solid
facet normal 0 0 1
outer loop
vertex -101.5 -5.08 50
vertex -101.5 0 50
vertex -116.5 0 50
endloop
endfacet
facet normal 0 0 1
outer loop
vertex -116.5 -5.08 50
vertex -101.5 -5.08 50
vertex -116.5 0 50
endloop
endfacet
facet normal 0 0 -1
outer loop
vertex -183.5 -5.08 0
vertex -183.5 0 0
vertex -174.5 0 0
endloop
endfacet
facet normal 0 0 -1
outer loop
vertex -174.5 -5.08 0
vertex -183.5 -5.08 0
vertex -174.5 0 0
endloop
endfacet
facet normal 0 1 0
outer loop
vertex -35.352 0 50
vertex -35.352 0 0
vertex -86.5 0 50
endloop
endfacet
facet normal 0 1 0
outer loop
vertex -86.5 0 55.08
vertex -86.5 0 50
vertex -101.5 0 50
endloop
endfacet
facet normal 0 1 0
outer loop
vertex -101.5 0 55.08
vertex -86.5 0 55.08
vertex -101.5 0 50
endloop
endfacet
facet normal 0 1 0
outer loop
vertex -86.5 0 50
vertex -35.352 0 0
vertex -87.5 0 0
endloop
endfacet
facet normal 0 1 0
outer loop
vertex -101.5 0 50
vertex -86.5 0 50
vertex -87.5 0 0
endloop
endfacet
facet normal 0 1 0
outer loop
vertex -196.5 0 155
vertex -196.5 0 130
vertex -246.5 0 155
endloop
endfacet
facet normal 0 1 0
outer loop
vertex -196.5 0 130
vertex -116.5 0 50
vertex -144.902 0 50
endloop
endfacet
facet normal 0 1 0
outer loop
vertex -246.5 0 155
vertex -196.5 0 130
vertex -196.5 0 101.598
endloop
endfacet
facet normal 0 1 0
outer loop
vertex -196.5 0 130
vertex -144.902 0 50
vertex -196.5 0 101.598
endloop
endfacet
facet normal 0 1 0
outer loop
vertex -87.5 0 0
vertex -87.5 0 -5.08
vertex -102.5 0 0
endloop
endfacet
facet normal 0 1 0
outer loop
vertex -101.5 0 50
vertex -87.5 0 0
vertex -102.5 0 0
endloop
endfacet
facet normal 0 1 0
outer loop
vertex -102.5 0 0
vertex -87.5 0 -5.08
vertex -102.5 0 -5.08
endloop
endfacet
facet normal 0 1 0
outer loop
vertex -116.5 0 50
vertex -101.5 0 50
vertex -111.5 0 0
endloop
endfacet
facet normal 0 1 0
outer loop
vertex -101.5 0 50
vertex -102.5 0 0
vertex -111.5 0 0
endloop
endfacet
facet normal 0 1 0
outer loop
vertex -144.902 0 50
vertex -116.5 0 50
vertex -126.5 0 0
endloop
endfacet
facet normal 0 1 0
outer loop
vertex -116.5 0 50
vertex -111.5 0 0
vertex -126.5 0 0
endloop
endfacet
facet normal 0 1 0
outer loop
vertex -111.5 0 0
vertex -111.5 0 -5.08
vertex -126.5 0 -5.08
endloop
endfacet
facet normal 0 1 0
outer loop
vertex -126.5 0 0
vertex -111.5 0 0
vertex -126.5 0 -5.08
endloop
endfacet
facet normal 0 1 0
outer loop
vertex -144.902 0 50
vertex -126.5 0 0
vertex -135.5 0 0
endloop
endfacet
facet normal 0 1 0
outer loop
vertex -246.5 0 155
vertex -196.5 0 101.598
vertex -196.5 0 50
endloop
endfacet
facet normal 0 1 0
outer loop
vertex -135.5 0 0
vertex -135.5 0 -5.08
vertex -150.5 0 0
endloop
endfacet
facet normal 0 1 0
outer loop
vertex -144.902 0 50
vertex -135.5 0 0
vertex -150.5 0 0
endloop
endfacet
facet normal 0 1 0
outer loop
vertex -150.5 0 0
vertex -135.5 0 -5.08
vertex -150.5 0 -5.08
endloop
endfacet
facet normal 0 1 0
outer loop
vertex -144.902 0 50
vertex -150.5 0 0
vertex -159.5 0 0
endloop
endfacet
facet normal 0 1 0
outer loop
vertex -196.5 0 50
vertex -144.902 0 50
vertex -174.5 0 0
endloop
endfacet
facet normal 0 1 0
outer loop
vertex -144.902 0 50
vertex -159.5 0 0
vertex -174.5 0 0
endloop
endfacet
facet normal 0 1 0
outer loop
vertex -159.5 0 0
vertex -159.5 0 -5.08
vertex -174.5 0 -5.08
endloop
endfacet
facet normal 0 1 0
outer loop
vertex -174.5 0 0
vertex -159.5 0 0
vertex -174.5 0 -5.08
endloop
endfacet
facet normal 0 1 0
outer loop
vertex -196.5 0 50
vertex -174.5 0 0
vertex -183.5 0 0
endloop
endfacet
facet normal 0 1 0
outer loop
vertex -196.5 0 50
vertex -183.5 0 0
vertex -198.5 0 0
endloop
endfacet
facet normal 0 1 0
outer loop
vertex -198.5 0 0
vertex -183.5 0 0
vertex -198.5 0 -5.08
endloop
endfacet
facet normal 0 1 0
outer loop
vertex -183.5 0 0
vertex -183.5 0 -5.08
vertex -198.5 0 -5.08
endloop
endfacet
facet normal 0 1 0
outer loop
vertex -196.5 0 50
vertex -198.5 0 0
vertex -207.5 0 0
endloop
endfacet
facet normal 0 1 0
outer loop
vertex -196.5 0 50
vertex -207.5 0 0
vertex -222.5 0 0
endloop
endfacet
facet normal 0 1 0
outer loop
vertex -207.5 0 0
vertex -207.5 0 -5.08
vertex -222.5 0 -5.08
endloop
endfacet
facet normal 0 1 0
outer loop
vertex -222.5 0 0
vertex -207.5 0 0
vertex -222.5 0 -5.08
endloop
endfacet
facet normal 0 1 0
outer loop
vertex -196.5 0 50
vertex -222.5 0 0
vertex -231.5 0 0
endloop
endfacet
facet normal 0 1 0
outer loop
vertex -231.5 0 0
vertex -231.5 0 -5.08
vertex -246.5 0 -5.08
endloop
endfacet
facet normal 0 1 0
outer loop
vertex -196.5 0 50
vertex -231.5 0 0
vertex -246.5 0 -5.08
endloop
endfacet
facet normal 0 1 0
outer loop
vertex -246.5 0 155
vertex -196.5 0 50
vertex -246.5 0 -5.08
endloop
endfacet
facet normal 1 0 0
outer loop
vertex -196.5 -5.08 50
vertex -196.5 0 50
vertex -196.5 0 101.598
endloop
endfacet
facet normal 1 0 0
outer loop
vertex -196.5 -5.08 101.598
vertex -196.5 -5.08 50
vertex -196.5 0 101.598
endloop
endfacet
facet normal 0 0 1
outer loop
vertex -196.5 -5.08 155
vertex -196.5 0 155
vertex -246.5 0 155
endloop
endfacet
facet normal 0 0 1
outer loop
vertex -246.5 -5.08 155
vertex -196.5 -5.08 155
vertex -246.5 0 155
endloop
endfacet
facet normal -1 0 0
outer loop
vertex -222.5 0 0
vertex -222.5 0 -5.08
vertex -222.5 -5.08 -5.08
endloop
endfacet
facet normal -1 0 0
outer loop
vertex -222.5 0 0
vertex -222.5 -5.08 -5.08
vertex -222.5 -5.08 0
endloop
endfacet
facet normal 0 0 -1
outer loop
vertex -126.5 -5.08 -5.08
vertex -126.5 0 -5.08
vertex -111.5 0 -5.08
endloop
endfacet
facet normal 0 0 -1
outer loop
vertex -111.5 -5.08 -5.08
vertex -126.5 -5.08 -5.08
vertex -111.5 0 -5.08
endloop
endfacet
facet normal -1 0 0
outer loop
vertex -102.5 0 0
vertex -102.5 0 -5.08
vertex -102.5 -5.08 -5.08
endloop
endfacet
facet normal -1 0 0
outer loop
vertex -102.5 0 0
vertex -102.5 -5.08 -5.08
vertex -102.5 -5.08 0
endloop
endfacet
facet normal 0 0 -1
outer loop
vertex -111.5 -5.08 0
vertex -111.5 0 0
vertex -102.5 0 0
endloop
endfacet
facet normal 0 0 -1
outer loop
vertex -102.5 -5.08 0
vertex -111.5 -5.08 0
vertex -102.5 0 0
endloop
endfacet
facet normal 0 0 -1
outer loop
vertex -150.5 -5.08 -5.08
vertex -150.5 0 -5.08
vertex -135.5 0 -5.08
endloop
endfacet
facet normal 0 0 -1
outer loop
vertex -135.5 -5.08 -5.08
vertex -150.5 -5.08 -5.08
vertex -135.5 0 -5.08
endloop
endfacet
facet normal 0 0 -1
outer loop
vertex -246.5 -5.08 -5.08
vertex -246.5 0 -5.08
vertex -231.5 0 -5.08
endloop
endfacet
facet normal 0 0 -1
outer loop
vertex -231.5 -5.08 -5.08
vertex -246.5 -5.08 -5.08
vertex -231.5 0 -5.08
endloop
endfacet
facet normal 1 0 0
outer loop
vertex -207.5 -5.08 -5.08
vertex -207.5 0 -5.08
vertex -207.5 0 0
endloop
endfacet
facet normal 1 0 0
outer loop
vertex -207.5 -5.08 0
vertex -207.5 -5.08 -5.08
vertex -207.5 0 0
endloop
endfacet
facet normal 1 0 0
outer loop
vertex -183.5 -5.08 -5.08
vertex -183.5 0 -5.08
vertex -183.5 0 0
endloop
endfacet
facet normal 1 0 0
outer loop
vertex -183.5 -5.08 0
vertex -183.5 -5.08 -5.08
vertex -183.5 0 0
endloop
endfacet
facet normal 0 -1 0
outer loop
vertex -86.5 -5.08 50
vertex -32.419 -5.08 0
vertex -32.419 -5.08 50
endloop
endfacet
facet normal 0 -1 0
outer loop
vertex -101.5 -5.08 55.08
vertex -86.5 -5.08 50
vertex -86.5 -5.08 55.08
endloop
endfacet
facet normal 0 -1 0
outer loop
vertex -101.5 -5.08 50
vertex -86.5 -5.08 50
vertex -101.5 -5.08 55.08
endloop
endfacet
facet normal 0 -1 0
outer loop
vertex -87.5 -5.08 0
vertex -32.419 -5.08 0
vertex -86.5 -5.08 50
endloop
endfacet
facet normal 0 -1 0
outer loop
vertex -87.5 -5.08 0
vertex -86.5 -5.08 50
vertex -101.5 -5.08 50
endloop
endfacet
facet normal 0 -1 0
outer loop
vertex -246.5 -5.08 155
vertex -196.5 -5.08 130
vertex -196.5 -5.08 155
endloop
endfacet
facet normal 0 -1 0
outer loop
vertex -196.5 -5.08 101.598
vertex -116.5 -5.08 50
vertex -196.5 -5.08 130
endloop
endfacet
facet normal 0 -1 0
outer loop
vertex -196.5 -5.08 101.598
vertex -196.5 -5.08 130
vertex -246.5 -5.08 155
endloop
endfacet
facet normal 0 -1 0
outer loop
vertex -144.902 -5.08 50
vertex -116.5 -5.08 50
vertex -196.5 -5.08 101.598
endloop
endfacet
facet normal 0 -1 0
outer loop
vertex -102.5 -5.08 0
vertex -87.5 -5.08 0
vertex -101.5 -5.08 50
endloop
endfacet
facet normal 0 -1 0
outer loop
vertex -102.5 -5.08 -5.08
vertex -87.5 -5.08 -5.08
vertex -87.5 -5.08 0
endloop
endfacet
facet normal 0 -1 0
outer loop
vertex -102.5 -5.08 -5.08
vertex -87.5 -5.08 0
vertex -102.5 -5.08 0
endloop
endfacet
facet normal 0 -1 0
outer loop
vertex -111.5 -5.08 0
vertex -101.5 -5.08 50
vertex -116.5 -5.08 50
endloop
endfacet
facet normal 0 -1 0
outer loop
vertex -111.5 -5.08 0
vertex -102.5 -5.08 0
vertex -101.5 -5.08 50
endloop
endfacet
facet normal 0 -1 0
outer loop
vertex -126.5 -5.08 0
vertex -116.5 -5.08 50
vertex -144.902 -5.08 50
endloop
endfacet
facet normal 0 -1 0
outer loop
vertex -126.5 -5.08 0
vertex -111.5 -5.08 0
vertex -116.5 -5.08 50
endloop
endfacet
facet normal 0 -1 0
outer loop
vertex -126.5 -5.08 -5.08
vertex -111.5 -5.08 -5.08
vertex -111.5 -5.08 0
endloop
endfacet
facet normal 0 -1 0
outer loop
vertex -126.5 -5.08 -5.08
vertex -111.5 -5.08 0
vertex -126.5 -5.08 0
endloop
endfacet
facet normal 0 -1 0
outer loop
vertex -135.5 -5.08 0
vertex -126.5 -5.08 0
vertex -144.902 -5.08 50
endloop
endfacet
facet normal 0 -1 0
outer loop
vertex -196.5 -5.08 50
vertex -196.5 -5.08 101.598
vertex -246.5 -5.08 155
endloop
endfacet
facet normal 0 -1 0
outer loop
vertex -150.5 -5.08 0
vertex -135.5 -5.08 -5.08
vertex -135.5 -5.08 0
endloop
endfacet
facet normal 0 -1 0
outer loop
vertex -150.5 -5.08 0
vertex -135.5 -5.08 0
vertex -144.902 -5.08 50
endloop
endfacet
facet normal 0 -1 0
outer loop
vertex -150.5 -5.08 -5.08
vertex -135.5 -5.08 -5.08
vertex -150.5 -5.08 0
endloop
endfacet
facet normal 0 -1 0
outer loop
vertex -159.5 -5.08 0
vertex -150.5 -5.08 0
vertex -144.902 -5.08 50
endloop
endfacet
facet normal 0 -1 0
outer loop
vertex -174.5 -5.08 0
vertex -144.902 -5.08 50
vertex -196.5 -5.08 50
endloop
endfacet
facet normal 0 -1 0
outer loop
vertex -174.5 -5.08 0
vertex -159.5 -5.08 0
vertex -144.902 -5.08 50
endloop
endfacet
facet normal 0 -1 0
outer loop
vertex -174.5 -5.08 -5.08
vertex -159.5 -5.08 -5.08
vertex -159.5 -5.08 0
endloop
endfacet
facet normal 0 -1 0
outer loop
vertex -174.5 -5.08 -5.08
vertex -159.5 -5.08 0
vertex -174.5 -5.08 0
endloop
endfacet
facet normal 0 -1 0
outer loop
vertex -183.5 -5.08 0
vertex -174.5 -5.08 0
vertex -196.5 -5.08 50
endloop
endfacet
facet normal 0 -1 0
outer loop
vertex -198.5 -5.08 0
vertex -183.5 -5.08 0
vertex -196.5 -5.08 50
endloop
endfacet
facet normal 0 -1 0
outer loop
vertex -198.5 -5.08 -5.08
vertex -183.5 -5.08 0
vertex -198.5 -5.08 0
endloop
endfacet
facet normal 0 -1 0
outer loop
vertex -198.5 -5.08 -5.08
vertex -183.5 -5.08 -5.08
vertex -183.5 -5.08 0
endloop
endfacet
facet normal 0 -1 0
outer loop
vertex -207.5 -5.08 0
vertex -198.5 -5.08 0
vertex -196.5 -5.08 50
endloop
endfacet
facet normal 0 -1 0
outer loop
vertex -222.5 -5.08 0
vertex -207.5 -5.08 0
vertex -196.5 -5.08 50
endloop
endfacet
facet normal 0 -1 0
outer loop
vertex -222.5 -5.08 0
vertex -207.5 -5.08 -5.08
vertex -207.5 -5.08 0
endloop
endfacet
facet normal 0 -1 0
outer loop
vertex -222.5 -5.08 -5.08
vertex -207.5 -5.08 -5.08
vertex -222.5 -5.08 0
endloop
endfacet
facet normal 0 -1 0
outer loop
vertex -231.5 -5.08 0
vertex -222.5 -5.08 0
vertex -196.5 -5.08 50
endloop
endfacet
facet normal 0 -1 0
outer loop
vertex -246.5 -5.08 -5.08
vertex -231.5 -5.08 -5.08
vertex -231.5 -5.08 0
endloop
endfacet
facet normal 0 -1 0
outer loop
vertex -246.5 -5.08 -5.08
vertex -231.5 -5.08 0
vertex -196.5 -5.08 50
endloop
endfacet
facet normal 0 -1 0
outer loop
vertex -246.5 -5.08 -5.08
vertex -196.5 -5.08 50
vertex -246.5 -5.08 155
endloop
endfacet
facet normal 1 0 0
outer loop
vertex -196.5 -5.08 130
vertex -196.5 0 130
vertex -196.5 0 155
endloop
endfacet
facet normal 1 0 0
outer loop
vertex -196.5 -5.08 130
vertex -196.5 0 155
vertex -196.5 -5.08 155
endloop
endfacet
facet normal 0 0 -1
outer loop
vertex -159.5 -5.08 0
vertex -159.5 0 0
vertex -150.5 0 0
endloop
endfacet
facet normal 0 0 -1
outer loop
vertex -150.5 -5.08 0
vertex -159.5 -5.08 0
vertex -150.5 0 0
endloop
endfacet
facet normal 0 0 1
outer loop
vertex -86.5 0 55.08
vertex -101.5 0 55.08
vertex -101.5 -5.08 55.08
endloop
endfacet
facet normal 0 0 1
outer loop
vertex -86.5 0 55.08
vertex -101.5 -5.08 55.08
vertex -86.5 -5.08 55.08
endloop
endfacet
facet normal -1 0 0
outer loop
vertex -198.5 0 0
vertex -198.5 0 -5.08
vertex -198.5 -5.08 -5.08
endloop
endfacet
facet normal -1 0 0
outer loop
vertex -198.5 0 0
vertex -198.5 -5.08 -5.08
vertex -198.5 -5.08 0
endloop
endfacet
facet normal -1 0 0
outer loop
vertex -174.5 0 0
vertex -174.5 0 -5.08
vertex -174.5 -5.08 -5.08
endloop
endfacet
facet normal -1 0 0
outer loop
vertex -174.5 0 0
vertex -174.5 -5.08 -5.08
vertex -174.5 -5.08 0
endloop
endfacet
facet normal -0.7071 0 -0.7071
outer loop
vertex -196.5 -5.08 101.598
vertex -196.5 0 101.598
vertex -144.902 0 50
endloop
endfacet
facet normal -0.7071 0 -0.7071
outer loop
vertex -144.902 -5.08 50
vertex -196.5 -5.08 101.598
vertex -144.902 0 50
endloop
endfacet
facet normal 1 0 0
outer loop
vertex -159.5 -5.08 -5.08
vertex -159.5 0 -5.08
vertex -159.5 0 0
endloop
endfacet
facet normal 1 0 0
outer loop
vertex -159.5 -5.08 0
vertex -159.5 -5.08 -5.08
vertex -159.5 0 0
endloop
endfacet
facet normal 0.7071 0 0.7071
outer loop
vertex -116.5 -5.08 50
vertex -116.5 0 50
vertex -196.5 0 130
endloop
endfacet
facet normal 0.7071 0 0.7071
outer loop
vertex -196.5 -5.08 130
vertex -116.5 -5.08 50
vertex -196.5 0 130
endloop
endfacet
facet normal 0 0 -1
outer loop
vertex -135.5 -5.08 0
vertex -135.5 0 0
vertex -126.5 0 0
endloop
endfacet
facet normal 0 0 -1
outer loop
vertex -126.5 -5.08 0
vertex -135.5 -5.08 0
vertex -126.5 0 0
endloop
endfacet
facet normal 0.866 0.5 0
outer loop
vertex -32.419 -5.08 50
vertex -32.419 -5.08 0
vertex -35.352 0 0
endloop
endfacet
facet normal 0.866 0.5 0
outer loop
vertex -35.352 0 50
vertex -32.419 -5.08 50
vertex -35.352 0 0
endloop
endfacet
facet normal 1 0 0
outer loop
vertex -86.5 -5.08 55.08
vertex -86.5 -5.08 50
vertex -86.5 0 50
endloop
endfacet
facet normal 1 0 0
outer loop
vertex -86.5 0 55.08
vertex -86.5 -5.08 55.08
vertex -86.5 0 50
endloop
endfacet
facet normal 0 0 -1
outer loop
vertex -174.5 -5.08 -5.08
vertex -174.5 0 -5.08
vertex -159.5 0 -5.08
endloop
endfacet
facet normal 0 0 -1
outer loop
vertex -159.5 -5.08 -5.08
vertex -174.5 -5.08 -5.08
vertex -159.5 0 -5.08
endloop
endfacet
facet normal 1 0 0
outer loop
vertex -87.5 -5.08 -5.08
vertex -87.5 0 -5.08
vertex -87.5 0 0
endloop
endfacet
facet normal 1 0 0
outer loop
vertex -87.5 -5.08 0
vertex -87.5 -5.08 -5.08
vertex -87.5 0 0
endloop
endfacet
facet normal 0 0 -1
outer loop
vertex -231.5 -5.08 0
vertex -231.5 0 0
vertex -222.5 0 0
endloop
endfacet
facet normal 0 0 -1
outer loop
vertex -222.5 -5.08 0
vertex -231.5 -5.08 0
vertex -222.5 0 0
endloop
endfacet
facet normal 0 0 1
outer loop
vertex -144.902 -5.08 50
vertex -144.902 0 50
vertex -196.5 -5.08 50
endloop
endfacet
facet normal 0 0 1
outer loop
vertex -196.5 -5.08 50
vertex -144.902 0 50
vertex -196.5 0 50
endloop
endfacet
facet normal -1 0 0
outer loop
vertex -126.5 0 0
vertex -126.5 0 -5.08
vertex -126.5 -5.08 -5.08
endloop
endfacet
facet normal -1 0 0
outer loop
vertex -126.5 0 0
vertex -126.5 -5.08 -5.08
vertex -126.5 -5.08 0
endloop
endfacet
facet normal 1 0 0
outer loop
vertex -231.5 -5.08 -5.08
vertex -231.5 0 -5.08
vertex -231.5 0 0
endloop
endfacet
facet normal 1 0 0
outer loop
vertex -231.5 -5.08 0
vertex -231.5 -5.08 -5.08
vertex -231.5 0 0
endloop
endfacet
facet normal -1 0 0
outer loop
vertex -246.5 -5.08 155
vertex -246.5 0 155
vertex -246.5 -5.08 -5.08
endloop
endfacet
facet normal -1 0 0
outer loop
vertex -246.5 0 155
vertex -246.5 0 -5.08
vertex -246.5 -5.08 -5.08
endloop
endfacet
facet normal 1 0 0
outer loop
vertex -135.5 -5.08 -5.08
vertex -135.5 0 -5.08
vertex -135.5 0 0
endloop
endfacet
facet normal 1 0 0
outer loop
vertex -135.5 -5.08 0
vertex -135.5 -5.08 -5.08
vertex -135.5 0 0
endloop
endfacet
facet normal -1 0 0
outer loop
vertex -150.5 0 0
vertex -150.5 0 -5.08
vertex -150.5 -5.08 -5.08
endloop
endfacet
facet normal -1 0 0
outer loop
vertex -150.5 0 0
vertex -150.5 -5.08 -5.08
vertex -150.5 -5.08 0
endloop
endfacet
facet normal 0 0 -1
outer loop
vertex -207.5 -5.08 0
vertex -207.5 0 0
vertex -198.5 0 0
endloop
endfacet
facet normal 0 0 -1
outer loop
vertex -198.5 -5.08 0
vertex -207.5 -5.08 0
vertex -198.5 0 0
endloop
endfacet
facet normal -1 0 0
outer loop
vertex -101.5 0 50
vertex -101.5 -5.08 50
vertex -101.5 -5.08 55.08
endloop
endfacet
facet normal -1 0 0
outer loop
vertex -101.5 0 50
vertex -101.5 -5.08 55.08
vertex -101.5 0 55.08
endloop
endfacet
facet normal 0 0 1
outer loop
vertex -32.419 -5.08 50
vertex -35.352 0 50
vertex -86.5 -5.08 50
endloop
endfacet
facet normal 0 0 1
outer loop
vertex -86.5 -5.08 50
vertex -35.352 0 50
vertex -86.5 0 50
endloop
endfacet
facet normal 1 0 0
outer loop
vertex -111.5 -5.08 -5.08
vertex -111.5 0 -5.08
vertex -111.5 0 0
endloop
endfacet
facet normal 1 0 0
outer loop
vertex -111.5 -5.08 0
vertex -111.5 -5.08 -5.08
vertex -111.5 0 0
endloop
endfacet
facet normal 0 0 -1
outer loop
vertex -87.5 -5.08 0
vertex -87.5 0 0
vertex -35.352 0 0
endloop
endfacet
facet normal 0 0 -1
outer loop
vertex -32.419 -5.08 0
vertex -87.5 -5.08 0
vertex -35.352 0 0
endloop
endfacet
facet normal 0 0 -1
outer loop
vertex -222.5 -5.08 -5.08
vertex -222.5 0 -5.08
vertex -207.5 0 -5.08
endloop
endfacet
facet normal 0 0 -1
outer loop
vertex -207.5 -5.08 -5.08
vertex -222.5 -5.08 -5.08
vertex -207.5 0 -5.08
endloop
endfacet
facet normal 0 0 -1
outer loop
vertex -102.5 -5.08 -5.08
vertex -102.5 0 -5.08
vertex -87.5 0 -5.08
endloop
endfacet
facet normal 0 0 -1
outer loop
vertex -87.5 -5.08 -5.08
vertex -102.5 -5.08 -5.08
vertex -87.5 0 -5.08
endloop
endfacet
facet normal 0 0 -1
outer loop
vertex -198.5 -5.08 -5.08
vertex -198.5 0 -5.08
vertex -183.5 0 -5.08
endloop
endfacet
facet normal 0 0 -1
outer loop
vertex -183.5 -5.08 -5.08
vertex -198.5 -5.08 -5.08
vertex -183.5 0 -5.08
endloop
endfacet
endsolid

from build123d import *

# Parameters (mm, degrees)
F0_W     = 15
F0_H     = 5.08
F1_DEPTH = 5.08
F2_DEPTH = 25
F4_DEPTH = 58
F5_W     = 15
F5_H     = 5.08
F6_DEPTH = 5.08


# Not quite as in the source:
# - a feature names something its author has since deleted; it is built from what else it names


with BuildPart() as f1:
    # F0 (on Front) → F1 (new body)
    with BuildSketch(Plane.XZ):
        Polygon((-87.5, 0), (-32.419, 0), (-32.419, 50), (-116.5, 50), (-144.9023774395, 50), (-196.5, 50), (-196.5, 101.5976225605), (-196.5, 130), (-246.5, 130), (-246.5, 0), (-231.5, 0), (-222.5, 0), (-207.5, 0), (-198.5, 0), (-183.5, 0), (-174.5, 0), (-159.5, 0), (-150.5, 0), (-135.5, 0), (-126.5, 0), (-111.5, 0), (-102.5, 0), align=None)
        with Locations((-95, -2.54)):
            Rectangle(F0_W, F0_H)
        Polygon((-144.9023774395, 50), (-116.5, 50), (-196.5, 130), (-196.5, 101.5976225605), align=None)
        with Locations((-119, -2.54)):
            Rectangle(F0_W, F0_H)
        with Locations((-143, -2.54)):
            Rectangle(F0_W, F0_H)
        with Locations((-239, -2.54)):
            Rectangle(F0_W, F0_H)
        with Locations((-167, -2.54)):
            Rectangle(F0_W, F0_H)
        with Locations((-215, -2.54)):
            Rectangle(F0_W, F0_H)
        with Locations((-191, -2.54)):
            Rectangle(F0_W, F0_H)
    extrude(amount=F1_DEPTH)

    # F2 (add): a face of the model
    f2_faces = [f1.faces().sort_by_distance(p)[0] for p in [
        (-221.5, -2.54, 130),
    ]]
    extrude(f2_faces, amount=F2_DEPTH)

    # F3 (on face) → F4 (cut)
    with BuildSketch(Plane(origin=(0, 0, 0), x_dir=(1, 0, 0), z_dir=(0, 0, -1))):
        Polygon((-32.419, 0), (-32.419, 5.08), (-35.3519393675, 0), align=None)
    extrude(amount=-F4_DEPTH, mode=Mode.SUBTRACT)

    # F5 (on face) → F6 (join)
    with BuildSketch(Plane.XY.offset(50)):
        with Locations((-94, -2.54)):
            Rectangle(F5_W, F5_H)
    extrude(amount=F6_DEPTH)


solid = f1.part
